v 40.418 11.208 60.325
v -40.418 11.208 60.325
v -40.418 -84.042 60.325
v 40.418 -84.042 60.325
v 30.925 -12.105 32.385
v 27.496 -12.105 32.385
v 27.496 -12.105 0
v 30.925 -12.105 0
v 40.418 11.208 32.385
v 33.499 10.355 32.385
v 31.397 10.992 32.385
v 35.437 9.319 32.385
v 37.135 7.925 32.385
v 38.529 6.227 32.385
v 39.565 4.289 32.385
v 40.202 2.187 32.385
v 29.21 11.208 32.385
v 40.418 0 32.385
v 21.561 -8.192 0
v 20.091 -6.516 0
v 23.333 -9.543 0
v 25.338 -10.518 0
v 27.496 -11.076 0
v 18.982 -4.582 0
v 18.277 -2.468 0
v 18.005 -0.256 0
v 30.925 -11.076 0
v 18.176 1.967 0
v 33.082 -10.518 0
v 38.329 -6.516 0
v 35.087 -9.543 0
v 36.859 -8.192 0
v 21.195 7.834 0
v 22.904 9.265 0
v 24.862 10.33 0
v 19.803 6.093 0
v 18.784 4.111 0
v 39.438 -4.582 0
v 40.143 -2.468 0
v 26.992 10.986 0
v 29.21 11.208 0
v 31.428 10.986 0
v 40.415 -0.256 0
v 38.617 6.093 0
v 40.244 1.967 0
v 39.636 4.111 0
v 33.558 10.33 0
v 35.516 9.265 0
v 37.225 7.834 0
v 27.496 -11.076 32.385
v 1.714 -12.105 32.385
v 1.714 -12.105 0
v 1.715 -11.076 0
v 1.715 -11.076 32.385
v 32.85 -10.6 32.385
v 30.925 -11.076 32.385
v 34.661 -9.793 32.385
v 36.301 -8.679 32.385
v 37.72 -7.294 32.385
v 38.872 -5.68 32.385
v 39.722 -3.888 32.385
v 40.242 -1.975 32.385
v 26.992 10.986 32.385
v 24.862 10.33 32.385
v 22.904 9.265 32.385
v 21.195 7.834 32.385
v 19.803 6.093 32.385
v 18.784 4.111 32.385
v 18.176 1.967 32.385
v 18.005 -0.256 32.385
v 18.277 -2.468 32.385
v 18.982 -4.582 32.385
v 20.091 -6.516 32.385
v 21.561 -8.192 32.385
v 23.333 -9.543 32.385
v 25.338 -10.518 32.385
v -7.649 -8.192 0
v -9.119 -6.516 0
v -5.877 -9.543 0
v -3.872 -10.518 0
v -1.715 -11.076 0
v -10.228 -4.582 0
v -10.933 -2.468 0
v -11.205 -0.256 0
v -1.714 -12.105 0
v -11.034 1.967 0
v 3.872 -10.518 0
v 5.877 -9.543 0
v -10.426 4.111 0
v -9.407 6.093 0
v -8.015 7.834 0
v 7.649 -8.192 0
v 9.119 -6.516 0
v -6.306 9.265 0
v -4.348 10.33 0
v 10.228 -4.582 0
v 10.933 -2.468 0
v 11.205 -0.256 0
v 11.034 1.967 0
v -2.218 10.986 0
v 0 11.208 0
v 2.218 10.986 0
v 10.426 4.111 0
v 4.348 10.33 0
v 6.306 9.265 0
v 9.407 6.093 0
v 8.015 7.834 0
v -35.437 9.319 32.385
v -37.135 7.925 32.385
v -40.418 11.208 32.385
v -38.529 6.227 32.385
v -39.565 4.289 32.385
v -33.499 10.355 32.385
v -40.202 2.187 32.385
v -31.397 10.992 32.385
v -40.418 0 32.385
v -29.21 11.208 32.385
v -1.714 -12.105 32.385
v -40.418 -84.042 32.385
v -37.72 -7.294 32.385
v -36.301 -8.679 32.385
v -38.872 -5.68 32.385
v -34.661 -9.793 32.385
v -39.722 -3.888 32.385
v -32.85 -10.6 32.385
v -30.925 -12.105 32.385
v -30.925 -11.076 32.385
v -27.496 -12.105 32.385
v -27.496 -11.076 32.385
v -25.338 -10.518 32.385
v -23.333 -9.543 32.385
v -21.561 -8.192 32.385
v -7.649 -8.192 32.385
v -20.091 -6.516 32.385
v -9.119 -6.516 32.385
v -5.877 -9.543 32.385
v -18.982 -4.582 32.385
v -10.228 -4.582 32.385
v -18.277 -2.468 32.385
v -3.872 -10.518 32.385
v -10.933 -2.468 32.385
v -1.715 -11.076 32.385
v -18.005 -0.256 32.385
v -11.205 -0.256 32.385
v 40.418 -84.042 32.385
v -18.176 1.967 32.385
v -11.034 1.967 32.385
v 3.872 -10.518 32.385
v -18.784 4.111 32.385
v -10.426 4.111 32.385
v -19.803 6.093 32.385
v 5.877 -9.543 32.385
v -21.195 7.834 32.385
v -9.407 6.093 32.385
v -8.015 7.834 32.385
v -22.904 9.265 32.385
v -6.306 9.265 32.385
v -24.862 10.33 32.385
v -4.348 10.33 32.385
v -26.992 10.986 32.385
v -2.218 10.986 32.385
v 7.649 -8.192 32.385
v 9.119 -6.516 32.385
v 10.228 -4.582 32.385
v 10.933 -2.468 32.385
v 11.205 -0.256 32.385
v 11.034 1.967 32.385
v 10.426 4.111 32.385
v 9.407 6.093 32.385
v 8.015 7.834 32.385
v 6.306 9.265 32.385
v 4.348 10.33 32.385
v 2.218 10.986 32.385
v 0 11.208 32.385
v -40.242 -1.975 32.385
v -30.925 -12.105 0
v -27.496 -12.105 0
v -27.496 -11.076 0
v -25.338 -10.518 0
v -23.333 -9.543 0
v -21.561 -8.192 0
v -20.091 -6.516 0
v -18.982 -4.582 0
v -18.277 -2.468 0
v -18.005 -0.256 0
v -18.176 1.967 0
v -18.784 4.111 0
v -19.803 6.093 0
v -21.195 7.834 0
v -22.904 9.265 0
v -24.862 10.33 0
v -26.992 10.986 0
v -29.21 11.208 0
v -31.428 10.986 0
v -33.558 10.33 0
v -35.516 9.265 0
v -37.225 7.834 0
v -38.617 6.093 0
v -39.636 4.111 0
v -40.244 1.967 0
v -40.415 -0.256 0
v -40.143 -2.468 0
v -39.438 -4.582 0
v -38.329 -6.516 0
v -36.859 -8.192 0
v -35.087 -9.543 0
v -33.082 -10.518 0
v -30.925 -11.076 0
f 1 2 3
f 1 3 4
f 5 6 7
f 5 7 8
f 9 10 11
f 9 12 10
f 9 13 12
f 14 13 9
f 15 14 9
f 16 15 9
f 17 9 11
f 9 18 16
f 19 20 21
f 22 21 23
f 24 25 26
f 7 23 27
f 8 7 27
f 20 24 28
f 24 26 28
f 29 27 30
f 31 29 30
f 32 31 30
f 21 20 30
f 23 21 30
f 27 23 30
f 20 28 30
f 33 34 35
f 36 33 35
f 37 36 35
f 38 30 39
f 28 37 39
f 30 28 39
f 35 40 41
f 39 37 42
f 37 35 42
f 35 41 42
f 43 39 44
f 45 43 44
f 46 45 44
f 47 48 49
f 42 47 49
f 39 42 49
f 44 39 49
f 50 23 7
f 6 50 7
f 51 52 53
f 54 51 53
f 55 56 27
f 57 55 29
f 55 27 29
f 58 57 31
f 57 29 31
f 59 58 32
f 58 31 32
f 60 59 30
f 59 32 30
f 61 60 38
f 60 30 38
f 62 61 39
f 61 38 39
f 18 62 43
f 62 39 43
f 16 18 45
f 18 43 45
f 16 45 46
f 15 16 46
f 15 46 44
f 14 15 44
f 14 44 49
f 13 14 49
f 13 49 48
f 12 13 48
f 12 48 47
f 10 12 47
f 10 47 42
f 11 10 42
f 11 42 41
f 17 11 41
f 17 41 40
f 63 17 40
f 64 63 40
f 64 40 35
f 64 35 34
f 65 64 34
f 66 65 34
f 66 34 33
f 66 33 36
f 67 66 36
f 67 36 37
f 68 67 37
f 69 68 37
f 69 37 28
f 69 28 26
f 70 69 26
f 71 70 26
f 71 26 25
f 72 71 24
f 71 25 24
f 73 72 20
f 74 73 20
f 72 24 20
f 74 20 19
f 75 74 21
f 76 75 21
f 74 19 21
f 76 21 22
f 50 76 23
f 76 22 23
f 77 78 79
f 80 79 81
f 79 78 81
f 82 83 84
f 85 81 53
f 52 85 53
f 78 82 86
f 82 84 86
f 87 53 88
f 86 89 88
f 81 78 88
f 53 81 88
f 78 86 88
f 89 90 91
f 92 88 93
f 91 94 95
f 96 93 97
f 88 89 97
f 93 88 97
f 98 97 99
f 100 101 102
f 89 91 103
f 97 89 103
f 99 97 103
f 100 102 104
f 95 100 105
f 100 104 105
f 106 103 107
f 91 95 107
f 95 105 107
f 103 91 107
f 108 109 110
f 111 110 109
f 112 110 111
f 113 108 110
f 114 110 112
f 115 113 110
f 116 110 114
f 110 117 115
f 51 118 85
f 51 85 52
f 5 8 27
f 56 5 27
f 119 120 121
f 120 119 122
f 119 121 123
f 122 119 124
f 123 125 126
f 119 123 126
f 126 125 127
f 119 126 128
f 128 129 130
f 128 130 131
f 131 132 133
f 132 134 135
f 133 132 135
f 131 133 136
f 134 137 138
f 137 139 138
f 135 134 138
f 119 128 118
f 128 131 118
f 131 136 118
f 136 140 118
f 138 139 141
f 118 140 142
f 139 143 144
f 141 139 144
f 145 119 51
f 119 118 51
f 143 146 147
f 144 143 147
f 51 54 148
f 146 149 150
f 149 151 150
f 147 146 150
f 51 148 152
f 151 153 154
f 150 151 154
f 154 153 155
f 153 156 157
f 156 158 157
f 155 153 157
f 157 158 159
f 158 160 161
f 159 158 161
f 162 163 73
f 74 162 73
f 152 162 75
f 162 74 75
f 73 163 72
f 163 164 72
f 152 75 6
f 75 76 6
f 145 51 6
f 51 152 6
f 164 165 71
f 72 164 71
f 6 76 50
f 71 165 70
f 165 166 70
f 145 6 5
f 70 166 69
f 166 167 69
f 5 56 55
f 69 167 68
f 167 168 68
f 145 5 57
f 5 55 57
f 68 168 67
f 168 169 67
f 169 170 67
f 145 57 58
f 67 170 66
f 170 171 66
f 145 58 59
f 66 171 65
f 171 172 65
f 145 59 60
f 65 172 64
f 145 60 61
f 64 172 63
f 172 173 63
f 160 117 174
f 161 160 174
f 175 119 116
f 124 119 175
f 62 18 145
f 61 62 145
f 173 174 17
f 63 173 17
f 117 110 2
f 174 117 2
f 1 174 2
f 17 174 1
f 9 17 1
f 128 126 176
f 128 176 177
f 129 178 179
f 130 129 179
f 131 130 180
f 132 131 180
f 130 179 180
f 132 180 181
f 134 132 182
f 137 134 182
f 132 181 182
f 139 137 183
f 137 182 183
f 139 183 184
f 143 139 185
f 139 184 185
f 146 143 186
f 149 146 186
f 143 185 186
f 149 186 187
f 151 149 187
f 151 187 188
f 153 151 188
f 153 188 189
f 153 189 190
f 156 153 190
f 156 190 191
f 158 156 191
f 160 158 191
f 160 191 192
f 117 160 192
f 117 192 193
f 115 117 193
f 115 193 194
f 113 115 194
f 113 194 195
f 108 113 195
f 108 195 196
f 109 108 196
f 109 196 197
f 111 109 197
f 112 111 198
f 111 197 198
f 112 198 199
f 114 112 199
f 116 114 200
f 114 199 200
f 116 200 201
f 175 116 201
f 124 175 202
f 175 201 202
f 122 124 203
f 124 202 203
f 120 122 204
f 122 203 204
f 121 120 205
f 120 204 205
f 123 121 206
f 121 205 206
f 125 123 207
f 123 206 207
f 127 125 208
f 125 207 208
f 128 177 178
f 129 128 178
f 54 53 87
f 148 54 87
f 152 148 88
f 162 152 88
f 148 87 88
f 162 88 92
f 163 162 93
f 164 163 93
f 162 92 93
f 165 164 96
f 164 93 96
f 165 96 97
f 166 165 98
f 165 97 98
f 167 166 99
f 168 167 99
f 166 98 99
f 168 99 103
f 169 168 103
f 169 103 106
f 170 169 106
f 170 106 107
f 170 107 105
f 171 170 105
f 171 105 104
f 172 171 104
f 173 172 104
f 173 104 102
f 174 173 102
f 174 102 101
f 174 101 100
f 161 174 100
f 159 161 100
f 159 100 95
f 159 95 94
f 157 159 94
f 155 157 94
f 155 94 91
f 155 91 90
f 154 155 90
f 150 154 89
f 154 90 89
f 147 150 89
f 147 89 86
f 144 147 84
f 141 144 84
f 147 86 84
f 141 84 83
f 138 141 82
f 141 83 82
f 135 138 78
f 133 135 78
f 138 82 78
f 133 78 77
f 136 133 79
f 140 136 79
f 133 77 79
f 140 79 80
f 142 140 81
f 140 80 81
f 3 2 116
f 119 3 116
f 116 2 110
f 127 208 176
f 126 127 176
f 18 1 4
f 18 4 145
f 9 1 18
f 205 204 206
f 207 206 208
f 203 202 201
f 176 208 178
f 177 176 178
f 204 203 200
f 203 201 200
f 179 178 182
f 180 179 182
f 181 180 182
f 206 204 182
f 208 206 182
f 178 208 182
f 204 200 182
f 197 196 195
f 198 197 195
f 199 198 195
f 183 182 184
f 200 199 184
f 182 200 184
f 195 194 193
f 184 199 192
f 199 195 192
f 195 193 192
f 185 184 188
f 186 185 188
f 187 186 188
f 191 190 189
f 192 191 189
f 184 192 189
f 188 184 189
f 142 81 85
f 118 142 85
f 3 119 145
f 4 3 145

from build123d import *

# Parameters (mm, degrees)
SKETCH1_R                = 11.20775
BOSS_EXTRUDE1_DEPTH      = 60.325
LPATTERN1_COUNT          = 2
LPATTERN1_PITCH          = 29.21
LPATTERN1_2_COUNT        = 2
LPATTERN1_2_PITCH        = 29.21
SKETCH2_W                = 80.8355
SKETCH2_H                = 27.94
BOSS_EXTRUDE2_DEPTH      = 11.20775
BOSS_EXTRUDE2_DEPTH_BACK = 84.04225


with BuildPart() as part:
    # Sketch1 → Boss-Extrude1 (new body)
    with BuildSketch(Plane.XY):
        Circle(SKETCH1_R)
        with BuildLine():
            ThreePointArc((1.7145, -11.075836303), (0, -11.20775), (-1.7145, -11.075836303))
            Line((-1.7145, -11.075836303), (-1.7145, -12.104536303))
            Line((-1.7145, -12.104536303), (1.7145, -12.104536303))
            Line((1.7145, -12.104536303), (1.7145, -11.075836303))
        make_face()
    extrude(amount=BOSS_EXTRUDE1_DEPTH)


with BuildPart() as lpattern1_1:
    # LPattern1: pattern copy
    add(part.part.moved(Location(Vector(1, 0, 0) * (1 * LPATTERN1_PITCH))))


with BuildPart() as lpattern1_2_1:
    # LPattern1 2: pattern copy
    add(part.part.moved(Location(Vector(-1, 0, 0) * (1 * LPATTERN1_2_PITCH))))


with BuildPart() as lpattern1_2_2:
    # LPattern1 2: pattern copy
    add(lpattern1_1.part.moved(Location(Vector(-1, 0, 0) * (1 * LPATTERN1_2_PITCH))))


with BuildPart() as part_1:
    add(part.part)

    add(lpattern1_1.part)  # Boss-Extrude2 merges LPattern1_1

    add(lpattern1_2_1.part)  # Boss-Extrude2 merges LPattern1 2_1

    add(lpattern1_2_2.part)  # Boss-Extrude2 merges LPattern1 2_2
    # Sketch2 → Boss-Extrude2 (add, two sides)
    with BuildSketch(Plane(origin=(0, 0, 0), x_dir=(1, 0, 0), z_dir=(0, 1, 0))) as boss_extrude2_sk:
        with Locations((0, -46.355)):
            Rectangle(SKETCH2_W, SKETCH2_H)
    extrude(amount=BOSS_EXTRUDE2_DEPTH)
    extrude(boss_extrude2_sk.sketch, amount=-BOSS_EXTRUDE2_DEPTH_BACK)


solid = part_1.part
